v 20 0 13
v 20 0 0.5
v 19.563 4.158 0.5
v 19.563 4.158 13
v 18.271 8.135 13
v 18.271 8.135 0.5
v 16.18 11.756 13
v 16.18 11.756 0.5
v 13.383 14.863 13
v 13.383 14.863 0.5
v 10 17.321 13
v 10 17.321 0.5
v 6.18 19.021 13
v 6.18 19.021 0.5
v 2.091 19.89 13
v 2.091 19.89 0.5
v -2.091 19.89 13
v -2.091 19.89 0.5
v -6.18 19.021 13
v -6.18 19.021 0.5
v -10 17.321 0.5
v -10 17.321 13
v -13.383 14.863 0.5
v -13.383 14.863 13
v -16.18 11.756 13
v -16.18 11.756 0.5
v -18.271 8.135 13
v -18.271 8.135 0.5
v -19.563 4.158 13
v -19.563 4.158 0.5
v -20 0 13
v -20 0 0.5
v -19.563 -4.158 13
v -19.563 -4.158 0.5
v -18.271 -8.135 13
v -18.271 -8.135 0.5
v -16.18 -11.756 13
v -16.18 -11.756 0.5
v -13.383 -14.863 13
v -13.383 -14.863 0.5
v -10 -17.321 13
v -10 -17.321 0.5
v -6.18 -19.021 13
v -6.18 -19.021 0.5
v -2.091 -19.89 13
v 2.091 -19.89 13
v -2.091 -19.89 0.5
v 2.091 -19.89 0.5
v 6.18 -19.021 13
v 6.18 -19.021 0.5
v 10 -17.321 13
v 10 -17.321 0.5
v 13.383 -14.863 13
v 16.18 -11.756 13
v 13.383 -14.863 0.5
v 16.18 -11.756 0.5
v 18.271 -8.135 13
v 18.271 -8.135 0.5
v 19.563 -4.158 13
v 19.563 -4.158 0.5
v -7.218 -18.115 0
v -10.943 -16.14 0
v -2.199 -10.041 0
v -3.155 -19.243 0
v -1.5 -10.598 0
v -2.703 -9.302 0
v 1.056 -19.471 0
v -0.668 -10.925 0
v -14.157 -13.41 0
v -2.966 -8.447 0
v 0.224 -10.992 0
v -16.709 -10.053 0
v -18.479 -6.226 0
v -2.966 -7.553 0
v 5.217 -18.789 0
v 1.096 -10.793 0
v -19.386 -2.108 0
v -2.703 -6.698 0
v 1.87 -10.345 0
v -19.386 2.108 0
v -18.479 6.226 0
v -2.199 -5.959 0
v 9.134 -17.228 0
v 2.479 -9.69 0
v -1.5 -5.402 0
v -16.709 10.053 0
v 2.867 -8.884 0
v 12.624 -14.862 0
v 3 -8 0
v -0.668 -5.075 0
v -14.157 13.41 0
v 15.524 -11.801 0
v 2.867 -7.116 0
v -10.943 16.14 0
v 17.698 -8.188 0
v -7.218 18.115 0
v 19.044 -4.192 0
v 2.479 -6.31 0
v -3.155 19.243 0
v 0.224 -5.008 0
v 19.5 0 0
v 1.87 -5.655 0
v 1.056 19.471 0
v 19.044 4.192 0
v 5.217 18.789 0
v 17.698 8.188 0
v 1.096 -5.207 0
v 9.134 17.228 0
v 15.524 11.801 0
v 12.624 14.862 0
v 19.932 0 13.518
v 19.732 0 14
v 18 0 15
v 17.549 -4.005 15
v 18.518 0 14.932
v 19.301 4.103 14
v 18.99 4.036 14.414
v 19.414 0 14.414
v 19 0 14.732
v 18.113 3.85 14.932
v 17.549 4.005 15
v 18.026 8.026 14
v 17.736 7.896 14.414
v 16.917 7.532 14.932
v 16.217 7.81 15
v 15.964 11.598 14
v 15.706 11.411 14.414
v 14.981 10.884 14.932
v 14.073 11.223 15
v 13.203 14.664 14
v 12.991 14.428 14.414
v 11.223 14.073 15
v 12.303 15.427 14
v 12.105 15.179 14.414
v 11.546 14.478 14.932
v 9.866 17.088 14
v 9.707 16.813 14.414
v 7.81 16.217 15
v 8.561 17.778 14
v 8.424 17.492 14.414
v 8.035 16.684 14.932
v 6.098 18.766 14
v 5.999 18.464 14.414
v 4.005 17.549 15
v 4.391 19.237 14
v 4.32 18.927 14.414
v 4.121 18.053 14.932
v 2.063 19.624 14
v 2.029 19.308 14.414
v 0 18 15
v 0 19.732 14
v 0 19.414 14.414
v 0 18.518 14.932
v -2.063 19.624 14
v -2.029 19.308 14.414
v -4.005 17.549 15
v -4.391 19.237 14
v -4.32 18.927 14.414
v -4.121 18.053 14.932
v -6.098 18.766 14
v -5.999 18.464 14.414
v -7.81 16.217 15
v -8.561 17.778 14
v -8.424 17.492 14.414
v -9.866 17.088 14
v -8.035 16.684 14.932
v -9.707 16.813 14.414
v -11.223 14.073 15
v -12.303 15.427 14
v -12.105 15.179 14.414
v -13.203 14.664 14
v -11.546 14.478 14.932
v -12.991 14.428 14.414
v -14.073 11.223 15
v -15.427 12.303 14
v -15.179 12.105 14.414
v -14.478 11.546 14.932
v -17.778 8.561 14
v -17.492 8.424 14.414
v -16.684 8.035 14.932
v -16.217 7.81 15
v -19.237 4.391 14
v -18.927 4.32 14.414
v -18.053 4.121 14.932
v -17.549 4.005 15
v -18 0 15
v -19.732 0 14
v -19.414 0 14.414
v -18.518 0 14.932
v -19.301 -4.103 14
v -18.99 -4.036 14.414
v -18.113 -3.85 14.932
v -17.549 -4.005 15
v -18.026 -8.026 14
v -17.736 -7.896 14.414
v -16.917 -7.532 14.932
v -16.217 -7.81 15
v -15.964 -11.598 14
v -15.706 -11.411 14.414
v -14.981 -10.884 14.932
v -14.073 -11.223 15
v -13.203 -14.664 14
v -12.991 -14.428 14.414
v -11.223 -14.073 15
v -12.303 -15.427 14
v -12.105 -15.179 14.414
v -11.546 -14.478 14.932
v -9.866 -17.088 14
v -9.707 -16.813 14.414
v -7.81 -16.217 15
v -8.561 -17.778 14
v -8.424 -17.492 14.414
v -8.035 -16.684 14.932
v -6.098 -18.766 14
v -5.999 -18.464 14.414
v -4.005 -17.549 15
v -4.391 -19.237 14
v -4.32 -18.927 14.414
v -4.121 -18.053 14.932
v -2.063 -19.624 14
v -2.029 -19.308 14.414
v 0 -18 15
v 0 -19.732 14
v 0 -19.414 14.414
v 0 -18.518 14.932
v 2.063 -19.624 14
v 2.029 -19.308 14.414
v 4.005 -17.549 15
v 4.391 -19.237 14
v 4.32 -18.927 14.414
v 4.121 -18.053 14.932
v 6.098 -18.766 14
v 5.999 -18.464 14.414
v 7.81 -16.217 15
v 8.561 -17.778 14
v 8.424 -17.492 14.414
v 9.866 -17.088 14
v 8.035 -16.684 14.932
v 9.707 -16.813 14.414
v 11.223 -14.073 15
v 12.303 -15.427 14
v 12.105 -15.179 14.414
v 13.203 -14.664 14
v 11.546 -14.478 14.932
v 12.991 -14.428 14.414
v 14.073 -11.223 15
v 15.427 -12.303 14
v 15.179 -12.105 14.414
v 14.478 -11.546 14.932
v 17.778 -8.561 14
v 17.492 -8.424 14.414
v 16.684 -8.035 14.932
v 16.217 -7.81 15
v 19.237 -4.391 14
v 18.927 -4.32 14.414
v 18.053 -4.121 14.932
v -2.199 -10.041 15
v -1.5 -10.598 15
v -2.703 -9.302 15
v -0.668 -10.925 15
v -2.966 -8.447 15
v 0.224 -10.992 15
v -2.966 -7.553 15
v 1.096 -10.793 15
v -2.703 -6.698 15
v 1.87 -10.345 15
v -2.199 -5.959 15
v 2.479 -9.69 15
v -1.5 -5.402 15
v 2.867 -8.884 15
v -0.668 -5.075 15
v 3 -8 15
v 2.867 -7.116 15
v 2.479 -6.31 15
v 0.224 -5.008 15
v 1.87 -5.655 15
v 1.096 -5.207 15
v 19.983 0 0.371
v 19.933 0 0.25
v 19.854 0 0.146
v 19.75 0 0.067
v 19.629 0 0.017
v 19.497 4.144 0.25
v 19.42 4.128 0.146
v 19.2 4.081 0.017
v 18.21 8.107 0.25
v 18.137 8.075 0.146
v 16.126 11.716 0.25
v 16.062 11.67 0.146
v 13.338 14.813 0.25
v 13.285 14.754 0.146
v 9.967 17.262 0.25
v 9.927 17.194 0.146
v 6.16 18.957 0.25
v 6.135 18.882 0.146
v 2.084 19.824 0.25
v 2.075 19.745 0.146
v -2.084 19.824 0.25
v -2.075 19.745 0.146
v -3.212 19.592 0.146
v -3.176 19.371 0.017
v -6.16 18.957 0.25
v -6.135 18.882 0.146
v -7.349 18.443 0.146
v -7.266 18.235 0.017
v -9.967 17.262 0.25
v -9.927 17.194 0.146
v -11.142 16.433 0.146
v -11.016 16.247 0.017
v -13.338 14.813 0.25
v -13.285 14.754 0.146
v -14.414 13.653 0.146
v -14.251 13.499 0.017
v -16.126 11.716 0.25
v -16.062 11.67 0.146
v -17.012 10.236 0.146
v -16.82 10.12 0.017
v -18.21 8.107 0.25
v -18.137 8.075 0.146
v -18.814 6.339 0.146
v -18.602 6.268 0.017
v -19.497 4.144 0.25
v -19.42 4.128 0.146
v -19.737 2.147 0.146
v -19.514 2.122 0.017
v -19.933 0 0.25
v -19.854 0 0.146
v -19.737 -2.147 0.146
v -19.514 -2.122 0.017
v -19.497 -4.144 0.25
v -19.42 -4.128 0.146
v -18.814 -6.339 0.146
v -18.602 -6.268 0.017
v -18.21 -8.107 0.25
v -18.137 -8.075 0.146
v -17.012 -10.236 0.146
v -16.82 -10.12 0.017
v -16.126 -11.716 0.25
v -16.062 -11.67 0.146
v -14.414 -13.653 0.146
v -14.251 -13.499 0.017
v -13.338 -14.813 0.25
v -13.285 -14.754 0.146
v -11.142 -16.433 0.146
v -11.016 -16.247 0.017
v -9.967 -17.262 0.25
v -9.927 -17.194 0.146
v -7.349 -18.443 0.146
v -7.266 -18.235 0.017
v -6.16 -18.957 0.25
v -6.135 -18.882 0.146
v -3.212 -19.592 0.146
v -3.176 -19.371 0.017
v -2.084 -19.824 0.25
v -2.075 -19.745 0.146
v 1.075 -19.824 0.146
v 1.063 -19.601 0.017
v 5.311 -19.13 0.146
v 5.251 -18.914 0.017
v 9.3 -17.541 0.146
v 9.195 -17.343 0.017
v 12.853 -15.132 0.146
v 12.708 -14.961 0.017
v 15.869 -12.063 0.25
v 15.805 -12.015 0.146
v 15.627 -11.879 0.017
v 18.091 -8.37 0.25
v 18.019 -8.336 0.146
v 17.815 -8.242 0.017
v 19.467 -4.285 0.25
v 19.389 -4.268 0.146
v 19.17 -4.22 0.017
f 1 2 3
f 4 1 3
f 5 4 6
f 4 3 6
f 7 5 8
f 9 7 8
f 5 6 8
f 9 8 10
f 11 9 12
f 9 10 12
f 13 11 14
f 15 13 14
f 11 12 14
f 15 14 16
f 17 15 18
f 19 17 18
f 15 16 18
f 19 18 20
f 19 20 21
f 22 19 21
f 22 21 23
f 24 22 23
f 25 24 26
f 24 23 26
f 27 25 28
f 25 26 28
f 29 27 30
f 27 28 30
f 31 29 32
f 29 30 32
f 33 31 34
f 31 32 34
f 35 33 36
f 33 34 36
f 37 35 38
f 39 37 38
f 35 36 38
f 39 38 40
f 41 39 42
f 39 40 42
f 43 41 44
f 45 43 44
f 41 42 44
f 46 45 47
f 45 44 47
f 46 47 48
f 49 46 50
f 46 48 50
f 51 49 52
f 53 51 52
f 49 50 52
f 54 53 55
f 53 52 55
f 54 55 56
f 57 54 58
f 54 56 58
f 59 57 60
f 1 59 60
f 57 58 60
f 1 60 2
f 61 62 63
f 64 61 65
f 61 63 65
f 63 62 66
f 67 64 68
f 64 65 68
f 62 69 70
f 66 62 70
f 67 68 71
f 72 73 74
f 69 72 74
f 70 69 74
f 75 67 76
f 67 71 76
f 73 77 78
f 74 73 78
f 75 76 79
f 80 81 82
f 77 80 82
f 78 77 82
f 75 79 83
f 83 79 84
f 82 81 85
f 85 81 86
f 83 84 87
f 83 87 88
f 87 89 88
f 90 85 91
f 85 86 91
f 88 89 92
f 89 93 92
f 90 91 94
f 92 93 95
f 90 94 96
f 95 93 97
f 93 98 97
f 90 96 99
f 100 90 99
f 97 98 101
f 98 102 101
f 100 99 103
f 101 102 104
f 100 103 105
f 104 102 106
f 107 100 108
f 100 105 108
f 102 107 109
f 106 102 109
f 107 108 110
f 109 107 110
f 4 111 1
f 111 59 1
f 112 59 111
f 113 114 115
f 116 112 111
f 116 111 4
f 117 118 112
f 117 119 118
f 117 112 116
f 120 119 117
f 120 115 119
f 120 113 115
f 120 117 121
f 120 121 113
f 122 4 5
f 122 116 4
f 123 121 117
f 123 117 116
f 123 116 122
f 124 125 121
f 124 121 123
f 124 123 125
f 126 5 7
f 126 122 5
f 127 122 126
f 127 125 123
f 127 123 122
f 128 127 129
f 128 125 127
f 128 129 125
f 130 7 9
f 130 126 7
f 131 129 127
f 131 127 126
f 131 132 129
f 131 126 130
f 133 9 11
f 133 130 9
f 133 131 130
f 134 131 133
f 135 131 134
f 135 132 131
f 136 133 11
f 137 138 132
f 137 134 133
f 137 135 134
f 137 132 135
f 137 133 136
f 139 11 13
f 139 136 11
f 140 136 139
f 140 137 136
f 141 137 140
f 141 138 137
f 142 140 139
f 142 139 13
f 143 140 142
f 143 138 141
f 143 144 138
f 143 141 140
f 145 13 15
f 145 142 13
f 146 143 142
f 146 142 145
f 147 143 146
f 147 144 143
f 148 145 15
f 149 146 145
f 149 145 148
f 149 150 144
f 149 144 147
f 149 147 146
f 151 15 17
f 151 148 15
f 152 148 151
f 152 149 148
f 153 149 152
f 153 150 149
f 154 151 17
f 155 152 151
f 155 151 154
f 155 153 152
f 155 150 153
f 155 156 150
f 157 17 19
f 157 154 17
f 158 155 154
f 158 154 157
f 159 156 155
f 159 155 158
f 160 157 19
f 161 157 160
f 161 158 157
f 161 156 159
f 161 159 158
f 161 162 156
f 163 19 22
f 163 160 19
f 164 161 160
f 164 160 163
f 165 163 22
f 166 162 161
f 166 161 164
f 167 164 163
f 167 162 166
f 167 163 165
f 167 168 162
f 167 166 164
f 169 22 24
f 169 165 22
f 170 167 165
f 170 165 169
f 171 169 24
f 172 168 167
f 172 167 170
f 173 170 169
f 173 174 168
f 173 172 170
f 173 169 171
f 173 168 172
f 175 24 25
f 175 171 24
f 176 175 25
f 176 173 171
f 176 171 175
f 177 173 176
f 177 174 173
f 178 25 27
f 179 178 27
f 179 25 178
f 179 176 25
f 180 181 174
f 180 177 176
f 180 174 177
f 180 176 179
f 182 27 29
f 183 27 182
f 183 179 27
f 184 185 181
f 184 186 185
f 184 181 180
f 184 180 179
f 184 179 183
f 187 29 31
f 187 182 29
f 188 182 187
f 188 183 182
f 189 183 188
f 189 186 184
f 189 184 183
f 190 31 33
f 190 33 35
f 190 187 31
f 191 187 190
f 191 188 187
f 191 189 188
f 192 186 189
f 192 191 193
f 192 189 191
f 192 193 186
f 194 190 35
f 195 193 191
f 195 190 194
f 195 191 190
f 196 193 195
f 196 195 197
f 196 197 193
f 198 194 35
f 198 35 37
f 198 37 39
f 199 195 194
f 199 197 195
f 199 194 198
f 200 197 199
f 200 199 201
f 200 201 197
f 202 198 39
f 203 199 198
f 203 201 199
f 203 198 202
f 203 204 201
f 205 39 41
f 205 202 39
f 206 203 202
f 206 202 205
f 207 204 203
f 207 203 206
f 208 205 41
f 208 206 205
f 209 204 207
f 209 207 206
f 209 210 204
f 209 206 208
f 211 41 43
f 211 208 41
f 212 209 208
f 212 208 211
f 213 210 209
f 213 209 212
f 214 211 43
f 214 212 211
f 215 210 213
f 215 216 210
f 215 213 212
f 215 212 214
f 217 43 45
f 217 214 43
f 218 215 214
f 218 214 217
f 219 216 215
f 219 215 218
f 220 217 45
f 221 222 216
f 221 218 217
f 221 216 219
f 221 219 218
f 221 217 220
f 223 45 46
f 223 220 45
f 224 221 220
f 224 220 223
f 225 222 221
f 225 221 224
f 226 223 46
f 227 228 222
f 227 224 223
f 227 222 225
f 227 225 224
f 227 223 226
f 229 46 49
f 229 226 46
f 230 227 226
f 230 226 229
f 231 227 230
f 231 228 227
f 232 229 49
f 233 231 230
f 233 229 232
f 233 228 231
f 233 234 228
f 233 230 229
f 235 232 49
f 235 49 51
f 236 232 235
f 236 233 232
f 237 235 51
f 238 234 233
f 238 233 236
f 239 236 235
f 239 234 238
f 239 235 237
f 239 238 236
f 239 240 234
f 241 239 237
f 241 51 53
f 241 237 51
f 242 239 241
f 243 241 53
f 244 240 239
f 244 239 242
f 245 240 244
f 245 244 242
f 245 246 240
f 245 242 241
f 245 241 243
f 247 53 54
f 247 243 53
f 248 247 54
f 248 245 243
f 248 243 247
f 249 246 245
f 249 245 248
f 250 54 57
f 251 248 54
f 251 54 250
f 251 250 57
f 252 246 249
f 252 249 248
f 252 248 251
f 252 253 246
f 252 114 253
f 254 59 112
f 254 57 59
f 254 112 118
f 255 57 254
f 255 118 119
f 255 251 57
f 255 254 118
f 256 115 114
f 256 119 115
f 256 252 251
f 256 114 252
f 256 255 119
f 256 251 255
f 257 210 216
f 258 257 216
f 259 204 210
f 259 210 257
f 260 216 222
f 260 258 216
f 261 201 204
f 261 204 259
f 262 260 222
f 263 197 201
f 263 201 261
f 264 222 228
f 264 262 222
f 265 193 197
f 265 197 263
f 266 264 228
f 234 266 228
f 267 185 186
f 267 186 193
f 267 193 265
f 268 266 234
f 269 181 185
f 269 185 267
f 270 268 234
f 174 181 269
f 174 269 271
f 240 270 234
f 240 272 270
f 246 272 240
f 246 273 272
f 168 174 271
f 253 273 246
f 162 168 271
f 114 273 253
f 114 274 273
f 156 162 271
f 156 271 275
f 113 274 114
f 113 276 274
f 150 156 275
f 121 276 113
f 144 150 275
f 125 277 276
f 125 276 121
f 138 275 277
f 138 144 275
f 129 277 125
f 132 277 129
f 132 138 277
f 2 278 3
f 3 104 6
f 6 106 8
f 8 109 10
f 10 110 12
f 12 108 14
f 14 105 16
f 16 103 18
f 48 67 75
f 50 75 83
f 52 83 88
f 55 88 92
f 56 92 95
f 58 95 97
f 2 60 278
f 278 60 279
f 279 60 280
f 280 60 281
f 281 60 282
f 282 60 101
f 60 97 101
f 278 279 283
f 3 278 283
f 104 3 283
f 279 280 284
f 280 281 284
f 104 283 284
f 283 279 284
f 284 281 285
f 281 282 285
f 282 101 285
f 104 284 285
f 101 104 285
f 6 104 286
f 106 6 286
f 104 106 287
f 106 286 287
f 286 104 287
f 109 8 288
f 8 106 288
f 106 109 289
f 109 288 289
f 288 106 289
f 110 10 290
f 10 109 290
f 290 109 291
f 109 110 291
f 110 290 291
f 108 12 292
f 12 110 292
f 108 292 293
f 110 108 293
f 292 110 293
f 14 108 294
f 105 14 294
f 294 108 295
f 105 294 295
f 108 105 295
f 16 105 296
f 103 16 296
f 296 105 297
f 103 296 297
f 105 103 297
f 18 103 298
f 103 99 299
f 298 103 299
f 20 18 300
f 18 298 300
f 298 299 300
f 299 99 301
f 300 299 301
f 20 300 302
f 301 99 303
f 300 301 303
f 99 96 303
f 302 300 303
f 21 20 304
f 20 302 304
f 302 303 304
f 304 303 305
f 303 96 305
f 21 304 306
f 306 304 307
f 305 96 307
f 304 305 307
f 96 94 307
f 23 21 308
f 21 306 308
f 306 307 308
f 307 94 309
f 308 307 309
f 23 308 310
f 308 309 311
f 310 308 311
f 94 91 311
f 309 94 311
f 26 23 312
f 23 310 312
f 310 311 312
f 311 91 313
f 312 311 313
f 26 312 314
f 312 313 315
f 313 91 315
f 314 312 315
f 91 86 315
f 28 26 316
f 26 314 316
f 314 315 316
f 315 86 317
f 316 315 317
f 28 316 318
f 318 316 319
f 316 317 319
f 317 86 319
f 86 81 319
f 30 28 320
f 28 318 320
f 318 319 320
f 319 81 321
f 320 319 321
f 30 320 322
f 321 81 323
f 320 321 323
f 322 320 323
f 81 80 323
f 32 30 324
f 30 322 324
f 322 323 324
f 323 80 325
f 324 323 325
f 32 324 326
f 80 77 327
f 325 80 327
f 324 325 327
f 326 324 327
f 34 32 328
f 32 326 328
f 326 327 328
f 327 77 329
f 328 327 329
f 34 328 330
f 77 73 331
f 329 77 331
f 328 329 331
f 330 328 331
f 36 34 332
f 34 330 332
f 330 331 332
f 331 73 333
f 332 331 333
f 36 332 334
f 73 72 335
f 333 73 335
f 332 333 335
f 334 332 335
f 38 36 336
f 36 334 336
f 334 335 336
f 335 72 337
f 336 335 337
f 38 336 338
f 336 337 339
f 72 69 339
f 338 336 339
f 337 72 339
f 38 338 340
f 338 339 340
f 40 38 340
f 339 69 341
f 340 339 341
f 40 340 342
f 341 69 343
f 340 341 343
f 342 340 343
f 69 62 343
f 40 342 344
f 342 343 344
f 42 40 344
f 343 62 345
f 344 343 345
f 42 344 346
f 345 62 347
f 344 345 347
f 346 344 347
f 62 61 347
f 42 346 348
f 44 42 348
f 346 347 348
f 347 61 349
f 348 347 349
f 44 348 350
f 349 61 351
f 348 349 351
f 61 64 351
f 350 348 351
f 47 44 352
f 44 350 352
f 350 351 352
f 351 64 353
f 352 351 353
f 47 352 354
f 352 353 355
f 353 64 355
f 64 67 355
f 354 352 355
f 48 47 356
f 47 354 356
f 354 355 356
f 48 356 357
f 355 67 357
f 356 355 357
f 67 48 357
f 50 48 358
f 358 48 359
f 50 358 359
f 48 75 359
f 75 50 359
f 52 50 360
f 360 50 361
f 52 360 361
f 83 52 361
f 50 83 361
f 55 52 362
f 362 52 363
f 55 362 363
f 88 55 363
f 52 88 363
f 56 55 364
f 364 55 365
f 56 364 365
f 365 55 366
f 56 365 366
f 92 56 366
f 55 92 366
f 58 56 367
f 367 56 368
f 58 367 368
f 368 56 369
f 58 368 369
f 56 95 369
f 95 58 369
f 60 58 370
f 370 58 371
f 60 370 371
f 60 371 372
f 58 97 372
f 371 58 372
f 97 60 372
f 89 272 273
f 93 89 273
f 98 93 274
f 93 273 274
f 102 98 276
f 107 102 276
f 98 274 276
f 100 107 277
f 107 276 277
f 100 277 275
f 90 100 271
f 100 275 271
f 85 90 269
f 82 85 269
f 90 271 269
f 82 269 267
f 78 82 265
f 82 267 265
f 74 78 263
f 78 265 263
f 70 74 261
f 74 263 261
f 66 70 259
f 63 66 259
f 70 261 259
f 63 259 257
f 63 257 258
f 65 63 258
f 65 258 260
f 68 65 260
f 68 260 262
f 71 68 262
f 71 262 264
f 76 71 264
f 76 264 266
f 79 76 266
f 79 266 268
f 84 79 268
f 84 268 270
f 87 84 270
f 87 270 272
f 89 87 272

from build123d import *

# Parameters (mm, degrees)
SKETCH1_R           = 20
BOSS_EXTRUDE1_DEPTH = 15
SKETCH2_R           = 3
CUT_EXTRUDE1_DEPTH  = 16
FILLET1_R           = 2
FILLET2_R           = 0.5


with BuildPart() as part:
    # Sketch1 → Boss-Extrude1 (new body)
    with BuildSketch(Plane.XY):
        Circle(SKETCH1_R)
    extrude(amount=BOSS_EXTRUDE1_DEPTH)

    # Sketch2 → Cut-Extrude1 (cut, through all)
    with BuildSketch(Plane.XY.offset(15)):
        with Locations((0, -8)):
            Circle(SKETCH2_R)
    extrude(amount=-CUT_EXTRUDE1_DEPTH, mode=Mode.SUBTRACT)

    # Fillet1
    fillet1_edges = [part.edges().sort_by_distance(p)[0] for p in [
        (-20, 0, 15),
    ]]
    fillet(fillet1_edges, radius=FILLET1_R)

    # Fillet2
    fillet2_edges = [part.edges().sort_by_distance(p)[0] for p in [
        (-20, 0, 0),
    ]]
    fillet(fillet2_edges, radius=FILLET2_R)


solid = part.part
